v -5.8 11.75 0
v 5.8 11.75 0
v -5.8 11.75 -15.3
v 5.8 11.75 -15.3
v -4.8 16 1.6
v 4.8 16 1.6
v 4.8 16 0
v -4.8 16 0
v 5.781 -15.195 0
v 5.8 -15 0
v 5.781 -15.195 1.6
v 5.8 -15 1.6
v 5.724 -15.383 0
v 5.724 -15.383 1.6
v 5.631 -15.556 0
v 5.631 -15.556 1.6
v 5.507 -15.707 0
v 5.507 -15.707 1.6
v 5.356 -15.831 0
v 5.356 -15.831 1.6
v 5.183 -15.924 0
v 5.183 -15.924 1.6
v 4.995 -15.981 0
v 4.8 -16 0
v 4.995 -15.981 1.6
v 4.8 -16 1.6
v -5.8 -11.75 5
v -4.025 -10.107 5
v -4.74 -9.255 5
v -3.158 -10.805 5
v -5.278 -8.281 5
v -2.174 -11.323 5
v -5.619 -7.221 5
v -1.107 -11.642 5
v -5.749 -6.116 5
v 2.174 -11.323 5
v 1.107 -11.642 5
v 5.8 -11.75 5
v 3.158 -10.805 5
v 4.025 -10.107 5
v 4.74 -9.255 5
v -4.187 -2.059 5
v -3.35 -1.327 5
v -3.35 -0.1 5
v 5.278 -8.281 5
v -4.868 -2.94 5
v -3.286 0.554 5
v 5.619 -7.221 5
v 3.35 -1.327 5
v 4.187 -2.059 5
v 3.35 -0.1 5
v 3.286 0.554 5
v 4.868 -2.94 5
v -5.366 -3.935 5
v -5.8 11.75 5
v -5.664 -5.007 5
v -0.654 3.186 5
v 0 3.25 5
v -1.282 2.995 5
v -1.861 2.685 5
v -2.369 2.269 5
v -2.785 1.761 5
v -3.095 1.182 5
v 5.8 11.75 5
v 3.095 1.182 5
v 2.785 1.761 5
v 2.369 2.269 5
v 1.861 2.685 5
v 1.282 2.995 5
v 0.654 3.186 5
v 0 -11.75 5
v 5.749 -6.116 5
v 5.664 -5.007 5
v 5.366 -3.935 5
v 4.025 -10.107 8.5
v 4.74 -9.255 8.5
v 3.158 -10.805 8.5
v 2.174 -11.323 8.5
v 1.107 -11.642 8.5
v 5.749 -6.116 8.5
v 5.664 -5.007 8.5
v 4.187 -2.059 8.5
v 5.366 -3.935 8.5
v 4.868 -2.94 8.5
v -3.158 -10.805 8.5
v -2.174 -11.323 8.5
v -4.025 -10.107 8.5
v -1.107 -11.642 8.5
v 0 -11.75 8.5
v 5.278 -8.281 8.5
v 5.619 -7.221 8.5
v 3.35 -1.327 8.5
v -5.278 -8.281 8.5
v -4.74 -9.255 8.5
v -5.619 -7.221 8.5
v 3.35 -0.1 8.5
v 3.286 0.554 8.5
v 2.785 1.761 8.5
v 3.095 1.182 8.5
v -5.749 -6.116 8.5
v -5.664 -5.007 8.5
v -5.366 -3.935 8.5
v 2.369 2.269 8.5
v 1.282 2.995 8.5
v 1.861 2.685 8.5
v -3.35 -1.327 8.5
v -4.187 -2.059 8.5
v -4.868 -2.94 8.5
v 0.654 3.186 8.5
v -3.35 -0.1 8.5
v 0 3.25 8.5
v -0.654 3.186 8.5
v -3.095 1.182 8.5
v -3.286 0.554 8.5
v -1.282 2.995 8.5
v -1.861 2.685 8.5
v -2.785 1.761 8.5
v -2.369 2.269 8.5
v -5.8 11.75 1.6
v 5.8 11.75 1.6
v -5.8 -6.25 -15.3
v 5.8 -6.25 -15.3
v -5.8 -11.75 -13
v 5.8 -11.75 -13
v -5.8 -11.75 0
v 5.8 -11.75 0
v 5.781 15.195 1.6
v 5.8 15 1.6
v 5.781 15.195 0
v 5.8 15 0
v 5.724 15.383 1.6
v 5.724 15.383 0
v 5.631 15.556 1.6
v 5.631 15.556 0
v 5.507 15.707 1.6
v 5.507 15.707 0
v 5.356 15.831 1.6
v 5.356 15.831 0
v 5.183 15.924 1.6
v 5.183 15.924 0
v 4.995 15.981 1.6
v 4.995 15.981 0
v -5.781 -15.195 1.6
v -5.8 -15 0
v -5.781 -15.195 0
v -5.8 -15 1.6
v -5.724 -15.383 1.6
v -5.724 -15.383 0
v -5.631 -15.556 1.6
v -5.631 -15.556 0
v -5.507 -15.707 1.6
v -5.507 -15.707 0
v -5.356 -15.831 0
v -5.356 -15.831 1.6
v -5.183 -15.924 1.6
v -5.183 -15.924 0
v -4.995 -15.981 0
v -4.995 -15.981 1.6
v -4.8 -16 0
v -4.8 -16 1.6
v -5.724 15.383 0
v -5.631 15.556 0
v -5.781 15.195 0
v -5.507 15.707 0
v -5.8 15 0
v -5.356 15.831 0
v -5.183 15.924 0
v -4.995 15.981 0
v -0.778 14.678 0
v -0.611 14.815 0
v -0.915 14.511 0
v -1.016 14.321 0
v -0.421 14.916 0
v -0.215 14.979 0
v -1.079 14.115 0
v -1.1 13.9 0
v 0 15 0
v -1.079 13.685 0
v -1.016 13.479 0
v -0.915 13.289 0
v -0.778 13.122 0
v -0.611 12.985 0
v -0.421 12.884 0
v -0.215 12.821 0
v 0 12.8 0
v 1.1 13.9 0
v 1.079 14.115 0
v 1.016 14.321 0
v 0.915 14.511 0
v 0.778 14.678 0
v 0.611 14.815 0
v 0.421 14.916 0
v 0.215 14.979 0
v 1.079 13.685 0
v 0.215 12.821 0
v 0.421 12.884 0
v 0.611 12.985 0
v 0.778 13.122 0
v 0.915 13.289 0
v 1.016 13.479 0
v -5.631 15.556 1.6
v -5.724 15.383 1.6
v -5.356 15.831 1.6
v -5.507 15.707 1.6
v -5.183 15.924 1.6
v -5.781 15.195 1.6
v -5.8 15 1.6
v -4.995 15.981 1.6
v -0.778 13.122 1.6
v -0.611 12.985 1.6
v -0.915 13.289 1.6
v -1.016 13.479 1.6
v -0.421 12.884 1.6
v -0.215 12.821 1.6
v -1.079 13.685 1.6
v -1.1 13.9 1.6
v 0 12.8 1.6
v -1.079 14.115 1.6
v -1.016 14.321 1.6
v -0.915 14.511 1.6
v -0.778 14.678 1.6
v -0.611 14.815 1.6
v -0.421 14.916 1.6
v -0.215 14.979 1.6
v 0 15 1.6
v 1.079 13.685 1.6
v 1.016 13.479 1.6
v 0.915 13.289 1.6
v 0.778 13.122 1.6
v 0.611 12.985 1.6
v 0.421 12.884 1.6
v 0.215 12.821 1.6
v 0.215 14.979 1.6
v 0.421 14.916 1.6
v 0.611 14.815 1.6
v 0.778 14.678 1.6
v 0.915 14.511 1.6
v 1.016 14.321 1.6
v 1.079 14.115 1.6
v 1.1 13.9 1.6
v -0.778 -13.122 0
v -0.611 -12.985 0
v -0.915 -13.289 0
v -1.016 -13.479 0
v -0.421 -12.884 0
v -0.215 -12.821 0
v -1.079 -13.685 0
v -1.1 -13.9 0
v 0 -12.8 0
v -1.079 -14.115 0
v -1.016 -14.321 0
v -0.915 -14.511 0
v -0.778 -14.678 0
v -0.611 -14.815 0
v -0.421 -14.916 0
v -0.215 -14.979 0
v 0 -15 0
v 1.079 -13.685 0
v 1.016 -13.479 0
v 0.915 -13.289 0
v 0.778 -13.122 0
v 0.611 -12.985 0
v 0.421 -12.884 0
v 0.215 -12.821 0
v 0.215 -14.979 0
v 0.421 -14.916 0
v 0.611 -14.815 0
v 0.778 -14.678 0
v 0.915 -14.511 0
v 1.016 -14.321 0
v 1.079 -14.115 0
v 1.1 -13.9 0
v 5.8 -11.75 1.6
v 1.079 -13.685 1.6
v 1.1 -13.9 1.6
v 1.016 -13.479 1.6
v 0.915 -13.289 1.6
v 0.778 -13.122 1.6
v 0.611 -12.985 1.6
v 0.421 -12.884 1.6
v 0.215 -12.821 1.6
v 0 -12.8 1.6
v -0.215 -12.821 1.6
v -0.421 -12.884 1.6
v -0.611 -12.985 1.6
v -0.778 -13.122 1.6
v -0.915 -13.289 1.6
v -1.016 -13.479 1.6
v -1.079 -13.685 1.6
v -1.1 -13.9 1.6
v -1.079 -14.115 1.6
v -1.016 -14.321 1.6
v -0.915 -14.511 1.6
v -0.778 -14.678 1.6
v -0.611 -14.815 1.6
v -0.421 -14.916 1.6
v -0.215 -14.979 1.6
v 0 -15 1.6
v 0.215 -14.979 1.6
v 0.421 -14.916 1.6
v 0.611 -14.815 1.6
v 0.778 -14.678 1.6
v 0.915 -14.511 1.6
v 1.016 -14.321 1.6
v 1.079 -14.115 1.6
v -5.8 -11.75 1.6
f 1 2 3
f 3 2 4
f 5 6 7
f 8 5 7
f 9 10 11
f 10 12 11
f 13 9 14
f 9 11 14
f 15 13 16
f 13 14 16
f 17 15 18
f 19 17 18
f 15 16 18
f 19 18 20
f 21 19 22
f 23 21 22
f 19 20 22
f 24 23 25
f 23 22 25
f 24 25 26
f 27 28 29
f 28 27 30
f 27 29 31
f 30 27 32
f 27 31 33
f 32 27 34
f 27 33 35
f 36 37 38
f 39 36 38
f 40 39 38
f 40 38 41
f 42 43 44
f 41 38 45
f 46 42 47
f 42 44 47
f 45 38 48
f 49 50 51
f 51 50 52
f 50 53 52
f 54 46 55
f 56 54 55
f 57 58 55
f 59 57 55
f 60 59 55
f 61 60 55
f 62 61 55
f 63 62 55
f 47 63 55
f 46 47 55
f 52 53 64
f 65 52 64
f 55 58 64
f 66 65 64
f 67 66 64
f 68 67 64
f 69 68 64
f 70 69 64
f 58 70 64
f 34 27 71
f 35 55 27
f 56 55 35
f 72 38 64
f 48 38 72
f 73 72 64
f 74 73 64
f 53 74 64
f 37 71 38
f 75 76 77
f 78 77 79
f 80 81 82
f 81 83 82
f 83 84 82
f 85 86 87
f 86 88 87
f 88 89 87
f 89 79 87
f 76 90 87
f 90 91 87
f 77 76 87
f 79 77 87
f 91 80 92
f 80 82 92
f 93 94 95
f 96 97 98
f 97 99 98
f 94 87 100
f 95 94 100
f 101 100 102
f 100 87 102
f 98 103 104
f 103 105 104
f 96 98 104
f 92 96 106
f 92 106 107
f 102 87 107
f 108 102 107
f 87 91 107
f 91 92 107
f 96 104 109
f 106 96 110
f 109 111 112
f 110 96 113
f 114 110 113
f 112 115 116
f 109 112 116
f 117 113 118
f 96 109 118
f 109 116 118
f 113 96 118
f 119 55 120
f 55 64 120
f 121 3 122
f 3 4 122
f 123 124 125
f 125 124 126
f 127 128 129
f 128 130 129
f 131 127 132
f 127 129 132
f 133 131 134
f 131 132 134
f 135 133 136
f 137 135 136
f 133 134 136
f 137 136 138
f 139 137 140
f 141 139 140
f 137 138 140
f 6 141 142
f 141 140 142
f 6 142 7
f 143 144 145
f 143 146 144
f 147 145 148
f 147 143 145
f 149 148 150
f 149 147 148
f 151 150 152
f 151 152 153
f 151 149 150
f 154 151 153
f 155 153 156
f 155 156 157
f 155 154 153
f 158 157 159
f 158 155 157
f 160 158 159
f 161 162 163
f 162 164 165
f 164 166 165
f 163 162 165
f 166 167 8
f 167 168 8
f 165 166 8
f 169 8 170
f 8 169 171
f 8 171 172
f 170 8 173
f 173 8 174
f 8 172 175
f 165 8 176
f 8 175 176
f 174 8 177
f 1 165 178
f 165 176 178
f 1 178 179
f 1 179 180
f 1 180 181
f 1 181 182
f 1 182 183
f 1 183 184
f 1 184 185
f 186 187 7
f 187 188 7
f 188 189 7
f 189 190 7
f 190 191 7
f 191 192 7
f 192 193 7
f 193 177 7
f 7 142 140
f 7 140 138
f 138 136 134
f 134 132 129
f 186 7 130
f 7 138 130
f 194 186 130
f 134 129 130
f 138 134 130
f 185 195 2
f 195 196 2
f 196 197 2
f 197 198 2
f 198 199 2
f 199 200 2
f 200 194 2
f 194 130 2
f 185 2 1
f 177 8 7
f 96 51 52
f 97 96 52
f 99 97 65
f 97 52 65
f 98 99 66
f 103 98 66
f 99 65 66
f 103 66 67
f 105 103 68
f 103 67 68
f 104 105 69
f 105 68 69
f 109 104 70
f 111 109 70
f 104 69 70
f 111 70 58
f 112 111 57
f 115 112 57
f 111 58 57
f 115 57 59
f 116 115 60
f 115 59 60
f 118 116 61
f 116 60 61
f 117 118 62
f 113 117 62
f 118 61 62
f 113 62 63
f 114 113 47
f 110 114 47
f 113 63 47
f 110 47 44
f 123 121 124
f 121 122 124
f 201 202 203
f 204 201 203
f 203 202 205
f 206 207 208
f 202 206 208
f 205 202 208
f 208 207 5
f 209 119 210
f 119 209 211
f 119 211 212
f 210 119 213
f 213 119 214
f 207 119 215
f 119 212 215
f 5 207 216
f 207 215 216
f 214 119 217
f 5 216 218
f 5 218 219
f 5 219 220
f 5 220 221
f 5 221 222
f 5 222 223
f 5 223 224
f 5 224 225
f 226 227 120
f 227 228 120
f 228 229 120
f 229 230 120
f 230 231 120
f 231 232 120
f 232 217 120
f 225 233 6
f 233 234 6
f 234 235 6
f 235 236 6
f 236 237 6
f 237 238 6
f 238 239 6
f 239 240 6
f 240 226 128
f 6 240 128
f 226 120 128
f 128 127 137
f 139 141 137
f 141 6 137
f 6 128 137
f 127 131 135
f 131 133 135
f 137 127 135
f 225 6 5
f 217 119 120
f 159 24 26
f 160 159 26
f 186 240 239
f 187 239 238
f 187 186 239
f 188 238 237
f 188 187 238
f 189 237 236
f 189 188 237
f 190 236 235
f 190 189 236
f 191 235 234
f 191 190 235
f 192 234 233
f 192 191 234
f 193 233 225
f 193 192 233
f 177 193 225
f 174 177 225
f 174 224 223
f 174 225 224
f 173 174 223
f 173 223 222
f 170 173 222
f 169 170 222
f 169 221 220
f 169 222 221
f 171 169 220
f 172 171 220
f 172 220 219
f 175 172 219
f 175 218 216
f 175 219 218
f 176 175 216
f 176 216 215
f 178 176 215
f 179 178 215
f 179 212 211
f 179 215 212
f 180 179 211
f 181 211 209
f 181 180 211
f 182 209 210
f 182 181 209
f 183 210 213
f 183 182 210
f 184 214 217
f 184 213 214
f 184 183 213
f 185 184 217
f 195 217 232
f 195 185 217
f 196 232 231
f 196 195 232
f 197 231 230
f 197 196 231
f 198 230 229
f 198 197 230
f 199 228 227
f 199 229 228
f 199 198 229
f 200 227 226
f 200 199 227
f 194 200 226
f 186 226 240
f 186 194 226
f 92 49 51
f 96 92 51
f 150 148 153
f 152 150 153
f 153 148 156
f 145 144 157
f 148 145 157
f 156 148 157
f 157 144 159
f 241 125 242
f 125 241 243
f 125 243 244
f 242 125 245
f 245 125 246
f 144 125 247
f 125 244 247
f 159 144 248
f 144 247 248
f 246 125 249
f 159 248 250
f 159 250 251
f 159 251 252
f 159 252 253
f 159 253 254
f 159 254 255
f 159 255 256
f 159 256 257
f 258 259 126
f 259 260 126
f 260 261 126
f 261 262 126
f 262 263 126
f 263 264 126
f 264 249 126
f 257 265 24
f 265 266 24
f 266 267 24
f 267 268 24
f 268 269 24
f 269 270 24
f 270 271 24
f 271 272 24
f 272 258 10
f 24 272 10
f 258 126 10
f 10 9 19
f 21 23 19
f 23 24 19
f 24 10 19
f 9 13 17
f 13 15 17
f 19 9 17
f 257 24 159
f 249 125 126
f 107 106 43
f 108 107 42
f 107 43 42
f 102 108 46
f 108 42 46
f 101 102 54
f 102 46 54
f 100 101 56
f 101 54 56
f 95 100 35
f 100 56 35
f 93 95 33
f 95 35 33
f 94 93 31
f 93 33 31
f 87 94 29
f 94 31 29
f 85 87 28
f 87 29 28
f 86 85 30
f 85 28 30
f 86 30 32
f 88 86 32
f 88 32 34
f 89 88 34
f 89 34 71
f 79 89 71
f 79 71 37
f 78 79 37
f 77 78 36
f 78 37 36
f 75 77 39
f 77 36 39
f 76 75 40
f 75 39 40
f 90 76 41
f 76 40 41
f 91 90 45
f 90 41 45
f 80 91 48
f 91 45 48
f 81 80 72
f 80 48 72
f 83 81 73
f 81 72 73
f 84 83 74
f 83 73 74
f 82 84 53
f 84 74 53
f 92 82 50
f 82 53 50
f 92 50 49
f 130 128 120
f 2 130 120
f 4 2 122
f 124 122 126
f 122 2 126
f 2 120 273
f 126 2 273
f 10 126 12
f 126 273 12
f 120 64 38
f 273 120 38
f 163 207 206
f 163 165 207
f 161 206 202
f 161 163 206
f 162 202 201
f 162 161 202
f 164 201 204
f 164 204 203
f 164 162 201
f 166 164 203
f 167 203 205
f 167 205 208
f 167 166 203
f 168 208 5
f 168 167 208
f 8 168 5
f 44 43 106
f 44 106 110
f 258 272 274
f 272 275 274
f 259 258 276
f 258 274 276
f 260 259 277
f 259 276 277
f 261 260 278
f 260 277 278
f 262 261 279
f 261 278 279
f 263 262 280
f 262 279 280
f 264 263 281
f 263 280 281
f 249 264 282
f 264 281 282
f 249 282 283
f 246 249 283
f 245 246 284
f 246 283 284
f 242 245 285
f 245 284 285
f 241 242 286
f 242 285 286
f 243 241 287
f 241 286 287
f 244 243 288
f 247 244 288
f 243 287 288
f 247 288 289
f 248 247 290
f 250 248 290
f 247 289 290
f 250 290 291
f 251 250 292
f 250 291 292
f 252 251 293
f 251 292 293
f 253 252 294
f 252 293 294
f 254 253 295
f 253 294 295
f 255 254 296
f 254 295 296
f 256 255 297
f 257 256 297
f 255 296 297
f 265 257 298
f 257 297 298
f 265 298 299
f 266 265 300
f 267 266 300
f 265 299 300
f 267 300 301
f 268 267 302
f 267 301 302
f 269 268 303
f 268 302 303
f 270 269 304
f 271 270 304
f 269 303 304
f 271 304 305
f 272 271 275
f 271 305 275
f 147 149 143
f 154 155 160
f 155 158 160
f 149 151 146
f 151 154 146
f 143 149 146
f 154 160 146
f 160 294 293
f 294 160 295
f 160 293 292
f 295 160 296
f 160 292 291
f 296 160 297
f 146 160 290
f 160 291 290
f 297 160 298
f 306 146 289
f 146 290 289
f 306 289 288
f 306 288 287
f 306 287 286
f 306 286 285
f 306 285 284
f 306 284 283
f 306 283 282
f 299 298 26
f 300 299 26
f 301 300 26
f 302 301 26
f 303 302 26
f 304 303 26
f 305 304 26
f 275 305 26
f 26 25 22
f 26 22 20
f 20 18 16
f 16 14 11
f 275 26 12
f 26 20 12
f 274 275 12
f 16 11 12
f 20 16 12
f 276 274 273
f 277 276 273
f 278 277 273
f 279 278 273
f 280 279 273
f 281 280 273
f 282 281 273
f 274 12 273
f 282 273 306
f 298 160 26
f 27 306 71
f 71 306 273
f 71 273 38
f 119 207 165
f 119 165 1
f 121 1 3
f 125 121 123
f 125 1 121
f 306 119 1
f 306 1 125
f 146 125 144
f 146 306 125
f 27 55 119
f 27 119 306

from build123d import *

# Parameters (mm, degrees)
PAD004_DEPTH    = 5.8
PAD007_DEPTH    = 3.5
SKETCH035_R     = 1.1
POCKET014_DEPTH = 2.5
FILLET001_R     = 1


with BuildPart() as part:
    # Sketch037 → Pad004 (new body, symmetric)
    with BuildSketch(Plane.YZ):
        Polygon((-16, 0), (-16, 1.6), (-11.75, 1.6), (-11.75, 5), (11.75, 5), (11.75, 1.6), (16, 1.6), (16, 0), (11.75, 0), (11.75, -15.3), (-6.25, -15.3), (-11.75, -13), (-11.75, 0), align=None)
    extrude(amount=PAD004_DEPTH, both=True)

    # Sketch006 (on DatumPlane) → Pad007 (join)
    with BuildSketch(Plane.XY.offset(5)):
        with BuildLine():
            Line((-3.35, -1.3266714218), (-3.35, -0.0999999323))
            ThreePointArc((3.35, -0.1000001307), (9.92e-08, 3.25), (-3.35, -0.0999999323))
            Line((3.35, -1.3266714218), (3.35, -0.1000001307))
            ThreePointArc((-3.35, -1.3266714218), (0, -11.75), (3.35, -1.3266714218))
        make_face()
    extrude(amount=PAD007_DEPTH)

    # Sketch035 → Pocket014 (cut, symmetric)
    with BuildSketch(Plane.XY):
        with Locations((0, 13.9)):
            Circle(SKETCH035_R)
        with Locations((0, -13.9)):
            Circle(SKETCH035_R)
    extrude(amount=POCKET014_DEPTH, both=True, mode=Mode.SUBTRACT)

    # Fillet001
    fillet001_edges = [part.edges().sort_by_distance(p)[0] for p in [
        (5.8, 16, 0.8),
        (-5.8, 16, 0.8),
        (5.8, -16, 0.8),
        (-5.8, -16, 0.8),
    ]]
    fillet(fillet001_edges, radius=FILLET001_R)


solid = part.part
